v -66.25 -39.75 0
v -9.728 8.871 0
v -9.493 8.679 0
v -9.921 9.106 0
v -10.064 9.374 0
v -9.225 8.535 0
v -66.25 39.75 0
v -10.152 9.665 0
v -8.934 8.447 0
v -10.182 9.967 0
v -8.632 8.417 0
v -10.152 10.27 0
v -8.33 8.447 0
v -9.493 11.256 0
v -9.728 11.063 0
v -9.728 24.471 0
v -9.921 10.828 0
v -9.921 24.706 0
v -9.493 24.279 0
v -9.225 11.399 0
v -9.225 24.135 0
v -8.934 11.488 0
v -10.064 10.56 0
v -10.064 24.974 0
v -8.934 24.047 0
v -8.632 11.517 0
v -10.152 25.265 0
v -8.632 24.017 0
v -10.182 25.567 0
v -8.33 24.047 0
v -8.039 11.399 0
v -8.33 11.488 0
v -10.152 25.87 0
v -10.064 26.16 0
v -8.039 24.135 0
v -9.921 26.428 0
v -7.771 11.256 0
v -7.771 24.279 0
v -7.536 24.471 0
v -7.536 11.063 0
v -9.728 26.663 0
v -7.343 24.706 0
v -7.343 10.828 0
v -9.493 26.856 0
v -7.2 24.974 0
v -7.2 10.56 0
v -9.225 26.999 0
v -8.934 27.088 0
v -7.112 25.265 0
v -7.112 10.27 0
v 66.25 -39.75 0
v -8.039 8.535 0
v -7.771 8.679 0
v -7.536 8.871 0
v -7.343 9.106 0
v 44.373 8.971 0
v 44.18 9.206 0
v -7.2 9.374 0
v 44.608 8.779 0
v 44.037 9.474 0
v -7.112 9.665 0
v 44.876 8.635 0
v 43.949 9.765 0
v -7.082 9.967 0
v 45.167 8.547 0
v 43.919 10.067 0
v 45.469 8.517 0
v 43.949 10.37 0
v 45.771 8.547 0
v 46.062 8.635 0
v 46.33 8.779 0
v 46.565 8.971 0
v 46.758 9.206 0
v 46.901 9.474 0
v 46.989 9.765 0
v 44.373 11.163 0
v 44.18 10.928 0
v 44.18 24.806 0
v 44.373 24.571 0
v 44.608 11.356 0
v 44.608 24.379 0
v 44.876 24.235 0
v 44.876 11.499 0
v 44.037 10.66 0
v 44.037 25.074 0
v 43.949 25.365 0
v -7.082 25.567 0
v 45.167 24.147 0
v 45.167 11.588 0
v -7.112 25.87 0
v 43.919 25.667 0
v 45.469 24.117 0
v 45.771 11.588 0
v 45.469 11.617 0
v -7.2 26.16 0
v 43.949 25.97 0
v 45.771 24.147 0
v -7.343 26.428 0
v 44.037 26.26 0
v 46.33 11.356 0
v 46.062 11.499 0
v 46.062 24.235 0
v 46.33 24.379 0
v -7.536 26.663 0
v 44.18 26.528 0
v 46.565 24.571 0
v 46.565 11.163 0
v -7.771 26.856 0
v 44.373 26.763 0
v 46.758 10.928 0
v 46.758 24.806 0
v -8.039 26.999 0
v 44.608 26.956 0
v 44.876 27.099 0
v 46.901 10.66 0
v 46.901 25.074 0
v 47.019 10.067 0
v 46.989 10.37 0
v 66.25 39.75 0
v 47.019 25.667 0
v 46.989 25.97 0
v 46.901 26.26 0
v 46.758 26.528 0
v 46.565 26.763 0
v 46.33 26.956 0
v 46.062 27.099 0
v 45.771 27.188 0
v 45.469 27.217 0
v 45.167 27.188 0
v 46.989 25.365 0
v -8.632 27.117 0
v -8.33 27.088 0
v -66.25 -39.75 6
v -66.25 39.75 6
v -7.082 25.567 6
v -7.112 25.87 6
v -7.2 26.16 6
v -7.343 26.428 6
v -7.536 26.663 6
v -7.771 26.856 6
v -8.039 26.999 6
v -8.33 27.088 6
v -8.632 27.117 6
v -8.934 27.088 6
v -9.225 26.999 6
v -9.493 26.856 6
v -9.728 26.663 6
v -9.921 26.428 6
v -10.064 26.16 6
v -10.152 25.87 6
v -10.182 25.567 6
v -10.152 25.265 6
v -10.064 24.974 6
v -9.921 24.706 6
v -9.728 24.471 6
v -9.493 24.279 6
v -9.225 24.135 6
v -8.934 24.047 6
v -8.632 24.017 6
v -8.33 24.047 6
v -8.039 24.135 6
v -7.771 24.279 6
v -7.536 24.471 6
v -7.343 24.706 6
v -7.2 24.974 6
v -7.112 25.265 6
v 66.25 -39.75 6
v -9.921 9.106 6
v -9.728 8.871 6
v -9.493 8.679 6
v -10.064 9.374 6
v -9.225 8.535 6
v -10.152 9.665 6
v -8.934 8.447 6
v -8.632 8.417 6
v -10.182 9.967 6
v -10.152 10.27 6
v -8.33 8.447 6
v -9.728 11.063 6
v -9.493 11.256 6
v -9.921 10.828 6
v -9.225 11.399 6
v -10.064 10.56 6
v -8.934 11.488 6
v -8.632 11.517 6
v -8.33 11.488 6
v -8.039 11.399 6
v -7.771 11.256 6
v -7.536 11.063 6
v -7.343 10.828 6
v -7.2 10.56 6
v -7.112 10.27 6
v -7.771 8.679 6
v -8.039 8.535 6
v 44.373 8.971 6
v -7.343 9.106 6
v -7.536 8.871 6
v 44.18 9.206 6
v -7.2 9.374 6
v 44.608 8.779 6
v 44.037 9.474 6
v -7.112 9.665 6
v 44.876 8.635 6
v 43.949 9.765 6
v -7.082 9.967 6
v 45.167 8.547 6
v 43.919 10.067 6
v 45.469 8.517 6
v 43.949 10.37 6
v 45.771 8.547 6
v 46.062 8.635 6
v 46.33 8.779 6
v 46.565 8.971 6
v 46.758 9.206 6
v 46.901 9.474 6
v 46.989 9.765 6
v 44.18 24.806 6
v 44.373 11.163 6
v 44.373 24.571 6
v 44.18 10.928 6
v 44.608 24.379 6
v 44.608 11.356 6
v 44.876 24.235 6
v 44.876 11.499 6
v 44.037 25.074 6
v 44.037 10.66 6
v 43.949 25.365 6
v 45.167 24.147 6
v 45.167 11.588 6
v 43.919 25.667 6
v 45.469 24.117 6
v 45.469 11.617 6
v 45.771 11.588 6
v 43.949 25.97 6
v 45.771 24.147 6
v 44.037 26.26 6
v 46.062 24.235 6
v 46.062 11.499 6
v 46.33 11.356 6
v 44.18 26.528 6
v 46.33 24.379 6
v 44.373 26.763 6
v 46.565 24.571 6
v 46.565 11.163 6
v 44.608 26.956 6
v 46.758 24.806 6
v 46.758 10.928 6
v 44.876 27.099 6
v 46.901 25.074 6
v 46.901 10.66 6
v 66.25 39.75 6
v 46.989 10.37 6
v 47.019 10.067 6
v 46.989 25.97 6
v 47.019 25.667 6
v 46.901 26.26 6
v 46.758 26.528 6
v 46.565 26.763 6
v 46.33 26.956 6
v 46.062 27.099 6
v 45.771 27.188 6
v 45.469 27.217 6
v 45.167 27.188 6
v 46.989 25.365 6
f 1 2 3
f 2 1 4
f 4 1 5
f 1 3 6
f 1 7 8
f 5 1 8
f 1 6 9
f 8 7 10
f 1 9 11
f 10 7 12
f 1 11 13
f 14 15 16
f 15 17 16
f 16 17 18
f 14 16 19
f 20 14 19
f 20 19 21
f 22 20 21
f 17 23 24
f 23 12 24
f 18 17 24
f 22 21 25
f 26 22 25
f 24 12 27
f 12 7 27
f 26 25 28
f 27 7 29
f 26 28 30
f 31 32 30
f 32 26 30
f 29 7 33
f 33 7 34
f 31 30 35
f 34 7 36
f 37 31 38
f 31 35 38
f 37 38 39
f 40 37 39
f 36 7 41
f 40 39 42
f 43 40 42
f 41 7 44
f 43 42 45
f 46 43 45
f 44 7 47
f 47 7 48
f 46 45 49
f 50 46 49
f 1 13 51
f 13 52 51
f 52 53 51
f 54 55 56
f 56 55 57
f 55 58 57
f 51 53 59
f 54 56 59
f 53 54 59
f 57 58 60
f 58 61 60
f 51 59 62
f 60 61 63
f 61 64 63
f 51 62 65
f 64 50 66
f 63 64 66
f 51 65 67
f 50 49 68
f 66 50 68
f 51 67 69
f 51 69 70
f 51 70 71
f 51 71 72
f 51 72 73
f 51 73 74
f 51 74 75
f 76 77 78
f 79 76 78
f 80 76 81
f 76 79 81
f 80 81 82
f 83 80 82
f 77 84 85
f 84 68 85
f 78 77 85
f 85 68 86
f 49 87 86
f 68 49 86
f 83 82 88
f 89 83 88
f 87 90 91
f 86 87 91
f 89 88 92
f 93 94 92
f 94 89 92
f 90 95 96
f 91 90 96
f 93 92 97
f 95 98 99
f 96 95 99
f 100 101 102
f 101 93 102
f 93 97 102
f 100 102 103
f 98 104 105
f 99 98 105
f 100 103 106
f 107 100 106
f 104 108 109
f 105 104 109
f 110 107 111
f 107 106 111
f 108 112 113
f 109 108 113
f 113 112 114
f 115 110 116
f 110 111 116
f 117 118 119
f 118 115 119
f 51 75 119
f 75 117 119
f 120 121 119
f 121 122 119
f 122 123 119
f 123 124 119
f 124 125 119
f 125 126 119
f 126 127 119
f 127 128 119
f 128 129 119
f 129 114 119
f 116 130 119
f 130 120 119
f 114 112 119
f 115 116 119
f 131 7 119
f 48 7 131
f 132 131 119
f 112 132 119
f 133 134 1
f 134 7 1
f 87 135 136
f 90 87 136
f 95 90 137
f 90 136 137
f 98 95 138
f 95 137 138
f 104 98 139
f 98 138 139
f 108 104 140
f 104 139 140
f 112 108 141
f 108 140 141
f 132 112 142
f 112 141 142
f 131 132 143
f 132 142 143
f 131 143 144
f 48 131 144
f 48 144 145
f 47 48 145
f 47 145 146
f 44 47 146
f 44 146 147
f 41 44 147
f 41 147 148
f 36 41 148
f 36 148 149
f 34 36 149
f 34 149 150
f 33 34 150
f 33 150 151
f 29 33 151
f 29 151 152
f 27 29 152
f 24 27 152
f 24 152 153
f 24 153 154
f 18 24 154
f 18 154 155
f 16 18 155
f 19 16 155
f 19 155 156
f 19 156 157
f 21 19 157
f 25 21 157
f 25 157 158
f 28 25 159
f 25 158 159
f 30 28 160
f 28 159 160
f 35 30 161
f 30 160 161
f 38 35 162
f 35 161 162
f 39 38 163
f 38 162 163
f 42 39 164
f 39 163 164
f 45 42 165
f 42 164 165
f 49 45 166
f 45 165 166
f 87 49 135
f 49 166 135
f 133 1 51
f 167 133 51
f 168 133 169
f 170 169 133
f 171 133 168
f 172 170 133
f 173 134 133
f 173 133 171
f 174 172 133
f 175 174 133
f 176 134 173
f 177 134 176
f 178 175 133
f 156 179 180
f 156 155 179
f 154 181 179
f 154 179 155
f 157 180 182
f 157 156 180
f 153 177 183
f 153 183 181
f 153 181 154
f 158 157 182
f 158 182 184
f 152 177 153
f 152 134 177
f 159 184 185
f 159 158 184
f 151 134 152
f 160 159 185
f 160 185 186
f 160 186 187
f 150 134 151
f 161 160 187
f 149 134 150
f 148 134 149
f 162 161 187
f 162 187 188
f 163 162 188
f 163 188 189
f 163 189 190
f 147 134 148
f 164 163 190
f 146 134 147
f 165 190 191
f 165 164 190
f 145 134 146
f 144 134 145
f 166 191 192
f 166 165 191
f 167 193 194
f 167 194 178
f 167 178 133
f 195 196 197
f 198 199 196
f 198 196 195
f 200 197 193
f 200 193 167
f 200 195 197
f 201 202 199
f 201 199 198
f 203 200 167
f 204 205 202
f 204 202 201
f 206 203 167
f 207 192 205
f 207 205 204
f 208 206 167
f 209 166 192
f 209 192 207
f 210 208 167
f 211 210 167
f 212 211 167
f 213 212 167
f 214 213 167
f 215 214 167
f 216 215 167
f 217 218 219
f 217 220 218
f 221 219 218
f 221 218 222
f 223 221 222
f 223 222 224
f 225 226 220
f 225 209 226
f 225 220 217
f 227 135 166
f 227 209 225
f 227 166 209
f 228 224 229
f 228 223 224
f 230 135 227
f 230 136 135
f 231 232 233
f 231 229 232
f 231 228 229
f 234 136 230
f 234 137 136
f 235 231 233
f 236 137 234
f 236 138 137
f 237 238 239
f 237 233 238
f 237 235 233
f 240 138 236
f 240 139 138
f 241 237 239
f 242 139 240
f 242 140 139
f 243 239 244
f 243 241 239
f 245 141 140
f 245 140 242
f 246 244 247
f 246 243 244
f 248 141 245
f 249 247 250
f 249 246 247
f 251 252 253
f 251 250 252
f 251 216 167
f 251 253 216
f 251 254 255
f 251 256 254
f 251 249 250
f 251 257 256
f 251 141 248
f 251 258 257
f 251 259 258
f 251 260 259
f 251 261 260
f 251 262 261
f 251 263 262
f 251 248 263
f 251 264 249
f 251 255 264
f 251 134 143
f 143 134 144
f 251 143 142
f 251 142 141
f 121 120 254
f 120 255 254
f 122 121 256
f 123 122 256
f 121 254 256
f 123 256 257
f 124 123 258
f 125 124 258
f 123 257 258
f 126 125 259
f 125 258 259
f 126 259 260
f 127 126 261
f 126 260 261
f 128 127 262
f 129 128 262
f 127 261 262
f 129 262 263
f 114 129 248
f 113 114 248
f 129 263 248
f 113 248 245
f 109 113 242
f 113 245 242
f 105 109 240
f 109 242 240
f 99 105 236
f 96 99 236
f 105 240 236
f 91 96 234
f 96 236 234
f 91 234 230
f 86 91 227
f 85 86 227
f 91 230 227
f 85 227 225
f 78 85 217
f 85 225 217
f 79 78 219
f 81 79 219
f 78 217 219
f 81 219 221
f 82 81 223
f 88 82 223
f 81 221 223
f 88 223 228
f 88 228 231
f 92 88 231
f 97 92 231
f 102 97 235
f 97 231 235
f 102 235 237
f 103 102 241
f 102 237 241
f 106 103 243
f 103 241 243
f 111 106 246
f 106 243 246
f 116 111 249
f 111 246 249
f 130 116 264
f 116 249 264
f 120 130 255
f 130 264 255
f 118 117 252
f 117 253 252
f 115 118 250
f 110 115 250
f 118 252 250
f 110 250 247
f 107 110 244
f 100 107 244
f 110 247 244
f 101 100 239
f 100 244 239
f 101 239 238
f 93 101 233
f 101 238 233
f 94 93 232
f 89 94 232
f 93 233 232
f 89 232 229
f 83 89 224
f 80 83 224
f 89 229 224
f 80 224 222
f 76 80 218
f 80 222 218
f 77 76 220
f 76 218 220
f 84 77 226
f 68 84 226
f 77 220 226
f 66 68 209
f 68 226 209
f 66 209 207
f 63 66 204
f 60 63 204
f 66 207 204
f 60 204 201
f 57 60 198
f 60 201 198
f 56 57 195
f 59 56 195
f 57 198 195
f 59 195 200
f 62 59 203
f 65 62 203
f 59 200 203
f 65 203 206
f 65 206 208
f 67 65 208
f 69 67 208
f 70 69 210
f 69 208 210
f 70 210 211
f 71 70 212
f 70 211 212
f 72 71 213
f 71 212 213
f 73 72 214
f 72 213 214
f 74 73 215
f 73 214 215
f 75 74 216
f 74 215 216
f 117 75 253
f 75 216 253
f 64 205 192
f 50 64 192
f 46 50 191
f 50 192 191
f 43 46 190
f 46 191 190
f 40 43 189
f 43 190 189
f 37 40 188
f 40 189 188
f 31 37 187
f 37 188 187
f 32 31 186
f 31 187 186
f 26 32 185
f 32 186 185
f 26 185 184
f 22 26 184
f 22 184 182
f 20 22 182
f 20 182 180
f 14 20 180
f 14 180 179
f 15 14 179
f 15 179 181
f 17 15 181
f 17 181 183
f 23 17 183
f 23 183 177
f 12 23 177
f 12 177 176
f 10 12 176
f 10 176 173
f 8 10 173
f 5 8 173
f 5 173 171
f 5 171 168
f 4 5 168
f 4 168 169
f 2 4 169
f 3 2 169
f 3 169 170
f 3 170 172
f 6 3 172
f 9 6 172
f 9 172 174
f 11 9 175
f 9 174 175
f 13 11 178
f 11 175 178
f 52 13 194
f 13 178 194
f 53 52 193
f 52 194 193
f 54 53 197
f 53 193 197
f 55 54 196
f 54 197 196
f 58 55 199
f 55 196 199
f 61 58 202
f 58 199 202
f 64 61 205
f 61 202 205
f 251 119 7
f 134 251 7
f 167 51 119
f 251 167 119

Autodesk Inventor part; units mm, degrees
ref_plane "YZ Plane" through (0, 0, 0) normal (1, 0, 0) x (0, 1, 0)
ref_plane "XZ Plane" through (0, 0, 0) normal (0, 1, 0) x (-1, 0, 0)
ref_plane "XY Plane" through (0, 0, 0) normal (0, 0, 1) x (1, 0, 0)
ref_plane "작업 평면1" through (0, 0, 0) normal (0, 0, 1) x (1, 0, 0)
sketch "스케치1" plane through (0, 0, 0) normal (0, 0, 1) x (1, 0, 0)
  line L0 (66.25, -39.75) -> (66.25, 39.75) projected
  line L1 (66.25, 39.75) -> (-66.25, 39.75) projected
  line L2 (-66.25, 39.75) -> (-66.25, -39.75) projected
  line L3 (-66.25, -39.75) -> (66.25, -39.75) projected
  point P0 (0, 0)
extrude "돌출1" add sketch "스케치1" along normal blind 6
sketch "스케치2" plane through (0, 0, 6) normal (0, 0, 1) x (1, 0, 0)
  line L0 (-5.632, 3.9673) -> (-5.632, 31.5673) projected
  line L1 (-11.632, 3.9673) -> (-11.632, 31.5673) projected
  line L2 (-11.632, 31.5673) -> (-5.632, 31.5673) projected
  line L3 (-5.632, 3.9673) -> (-5.632, 31.5673) projected
  line L4 (-11.632, 3.9673) -> (-5.632, 3.9673) projected
  line L5 (42.469, 4.0673) -> (42.469, 31.6673) projected
  line L6 (42.469, 4.0673) -> (48.469, 4.0673) projected
  line L7 (48.469, 4.0673) -> (48.469, 31.6673) projected
  line L8 (42.469, 31.6673) -> (48.469, 31.6673) projected
  line L9 (-8.632, 31.5673) -> (-8.632, 25.5673)
  circle A0 centre (-8.632, 25.5673) radius 1.55
  line L10 (-8.632, 3.9673) -> (-8.632, 9.9673)
  circle A1 centre (-8.632, 9.9673) radius 1.55
  circle A2 centre (45.469, 10.0673) radius 1.55
  circle A3 centre (45.469, 25.6673) radius 1.55
  point P0 (0, 0)
  dimension "d2" = 6
  dimension "d3" = 3.1
  dimension "d4" = 6
  dimension "d5" = 3.1
  dimension "d6" = 3.1
  dimension "d7" = 3.1
  dimension "d8" = 6
  dimension "d9" = 6
extrude "돌출2" cut sketch "스케치2" against normal blind 6 contours A0 | A1 | A2 | A3
properties part number "21" material "아크릴, 선명"
